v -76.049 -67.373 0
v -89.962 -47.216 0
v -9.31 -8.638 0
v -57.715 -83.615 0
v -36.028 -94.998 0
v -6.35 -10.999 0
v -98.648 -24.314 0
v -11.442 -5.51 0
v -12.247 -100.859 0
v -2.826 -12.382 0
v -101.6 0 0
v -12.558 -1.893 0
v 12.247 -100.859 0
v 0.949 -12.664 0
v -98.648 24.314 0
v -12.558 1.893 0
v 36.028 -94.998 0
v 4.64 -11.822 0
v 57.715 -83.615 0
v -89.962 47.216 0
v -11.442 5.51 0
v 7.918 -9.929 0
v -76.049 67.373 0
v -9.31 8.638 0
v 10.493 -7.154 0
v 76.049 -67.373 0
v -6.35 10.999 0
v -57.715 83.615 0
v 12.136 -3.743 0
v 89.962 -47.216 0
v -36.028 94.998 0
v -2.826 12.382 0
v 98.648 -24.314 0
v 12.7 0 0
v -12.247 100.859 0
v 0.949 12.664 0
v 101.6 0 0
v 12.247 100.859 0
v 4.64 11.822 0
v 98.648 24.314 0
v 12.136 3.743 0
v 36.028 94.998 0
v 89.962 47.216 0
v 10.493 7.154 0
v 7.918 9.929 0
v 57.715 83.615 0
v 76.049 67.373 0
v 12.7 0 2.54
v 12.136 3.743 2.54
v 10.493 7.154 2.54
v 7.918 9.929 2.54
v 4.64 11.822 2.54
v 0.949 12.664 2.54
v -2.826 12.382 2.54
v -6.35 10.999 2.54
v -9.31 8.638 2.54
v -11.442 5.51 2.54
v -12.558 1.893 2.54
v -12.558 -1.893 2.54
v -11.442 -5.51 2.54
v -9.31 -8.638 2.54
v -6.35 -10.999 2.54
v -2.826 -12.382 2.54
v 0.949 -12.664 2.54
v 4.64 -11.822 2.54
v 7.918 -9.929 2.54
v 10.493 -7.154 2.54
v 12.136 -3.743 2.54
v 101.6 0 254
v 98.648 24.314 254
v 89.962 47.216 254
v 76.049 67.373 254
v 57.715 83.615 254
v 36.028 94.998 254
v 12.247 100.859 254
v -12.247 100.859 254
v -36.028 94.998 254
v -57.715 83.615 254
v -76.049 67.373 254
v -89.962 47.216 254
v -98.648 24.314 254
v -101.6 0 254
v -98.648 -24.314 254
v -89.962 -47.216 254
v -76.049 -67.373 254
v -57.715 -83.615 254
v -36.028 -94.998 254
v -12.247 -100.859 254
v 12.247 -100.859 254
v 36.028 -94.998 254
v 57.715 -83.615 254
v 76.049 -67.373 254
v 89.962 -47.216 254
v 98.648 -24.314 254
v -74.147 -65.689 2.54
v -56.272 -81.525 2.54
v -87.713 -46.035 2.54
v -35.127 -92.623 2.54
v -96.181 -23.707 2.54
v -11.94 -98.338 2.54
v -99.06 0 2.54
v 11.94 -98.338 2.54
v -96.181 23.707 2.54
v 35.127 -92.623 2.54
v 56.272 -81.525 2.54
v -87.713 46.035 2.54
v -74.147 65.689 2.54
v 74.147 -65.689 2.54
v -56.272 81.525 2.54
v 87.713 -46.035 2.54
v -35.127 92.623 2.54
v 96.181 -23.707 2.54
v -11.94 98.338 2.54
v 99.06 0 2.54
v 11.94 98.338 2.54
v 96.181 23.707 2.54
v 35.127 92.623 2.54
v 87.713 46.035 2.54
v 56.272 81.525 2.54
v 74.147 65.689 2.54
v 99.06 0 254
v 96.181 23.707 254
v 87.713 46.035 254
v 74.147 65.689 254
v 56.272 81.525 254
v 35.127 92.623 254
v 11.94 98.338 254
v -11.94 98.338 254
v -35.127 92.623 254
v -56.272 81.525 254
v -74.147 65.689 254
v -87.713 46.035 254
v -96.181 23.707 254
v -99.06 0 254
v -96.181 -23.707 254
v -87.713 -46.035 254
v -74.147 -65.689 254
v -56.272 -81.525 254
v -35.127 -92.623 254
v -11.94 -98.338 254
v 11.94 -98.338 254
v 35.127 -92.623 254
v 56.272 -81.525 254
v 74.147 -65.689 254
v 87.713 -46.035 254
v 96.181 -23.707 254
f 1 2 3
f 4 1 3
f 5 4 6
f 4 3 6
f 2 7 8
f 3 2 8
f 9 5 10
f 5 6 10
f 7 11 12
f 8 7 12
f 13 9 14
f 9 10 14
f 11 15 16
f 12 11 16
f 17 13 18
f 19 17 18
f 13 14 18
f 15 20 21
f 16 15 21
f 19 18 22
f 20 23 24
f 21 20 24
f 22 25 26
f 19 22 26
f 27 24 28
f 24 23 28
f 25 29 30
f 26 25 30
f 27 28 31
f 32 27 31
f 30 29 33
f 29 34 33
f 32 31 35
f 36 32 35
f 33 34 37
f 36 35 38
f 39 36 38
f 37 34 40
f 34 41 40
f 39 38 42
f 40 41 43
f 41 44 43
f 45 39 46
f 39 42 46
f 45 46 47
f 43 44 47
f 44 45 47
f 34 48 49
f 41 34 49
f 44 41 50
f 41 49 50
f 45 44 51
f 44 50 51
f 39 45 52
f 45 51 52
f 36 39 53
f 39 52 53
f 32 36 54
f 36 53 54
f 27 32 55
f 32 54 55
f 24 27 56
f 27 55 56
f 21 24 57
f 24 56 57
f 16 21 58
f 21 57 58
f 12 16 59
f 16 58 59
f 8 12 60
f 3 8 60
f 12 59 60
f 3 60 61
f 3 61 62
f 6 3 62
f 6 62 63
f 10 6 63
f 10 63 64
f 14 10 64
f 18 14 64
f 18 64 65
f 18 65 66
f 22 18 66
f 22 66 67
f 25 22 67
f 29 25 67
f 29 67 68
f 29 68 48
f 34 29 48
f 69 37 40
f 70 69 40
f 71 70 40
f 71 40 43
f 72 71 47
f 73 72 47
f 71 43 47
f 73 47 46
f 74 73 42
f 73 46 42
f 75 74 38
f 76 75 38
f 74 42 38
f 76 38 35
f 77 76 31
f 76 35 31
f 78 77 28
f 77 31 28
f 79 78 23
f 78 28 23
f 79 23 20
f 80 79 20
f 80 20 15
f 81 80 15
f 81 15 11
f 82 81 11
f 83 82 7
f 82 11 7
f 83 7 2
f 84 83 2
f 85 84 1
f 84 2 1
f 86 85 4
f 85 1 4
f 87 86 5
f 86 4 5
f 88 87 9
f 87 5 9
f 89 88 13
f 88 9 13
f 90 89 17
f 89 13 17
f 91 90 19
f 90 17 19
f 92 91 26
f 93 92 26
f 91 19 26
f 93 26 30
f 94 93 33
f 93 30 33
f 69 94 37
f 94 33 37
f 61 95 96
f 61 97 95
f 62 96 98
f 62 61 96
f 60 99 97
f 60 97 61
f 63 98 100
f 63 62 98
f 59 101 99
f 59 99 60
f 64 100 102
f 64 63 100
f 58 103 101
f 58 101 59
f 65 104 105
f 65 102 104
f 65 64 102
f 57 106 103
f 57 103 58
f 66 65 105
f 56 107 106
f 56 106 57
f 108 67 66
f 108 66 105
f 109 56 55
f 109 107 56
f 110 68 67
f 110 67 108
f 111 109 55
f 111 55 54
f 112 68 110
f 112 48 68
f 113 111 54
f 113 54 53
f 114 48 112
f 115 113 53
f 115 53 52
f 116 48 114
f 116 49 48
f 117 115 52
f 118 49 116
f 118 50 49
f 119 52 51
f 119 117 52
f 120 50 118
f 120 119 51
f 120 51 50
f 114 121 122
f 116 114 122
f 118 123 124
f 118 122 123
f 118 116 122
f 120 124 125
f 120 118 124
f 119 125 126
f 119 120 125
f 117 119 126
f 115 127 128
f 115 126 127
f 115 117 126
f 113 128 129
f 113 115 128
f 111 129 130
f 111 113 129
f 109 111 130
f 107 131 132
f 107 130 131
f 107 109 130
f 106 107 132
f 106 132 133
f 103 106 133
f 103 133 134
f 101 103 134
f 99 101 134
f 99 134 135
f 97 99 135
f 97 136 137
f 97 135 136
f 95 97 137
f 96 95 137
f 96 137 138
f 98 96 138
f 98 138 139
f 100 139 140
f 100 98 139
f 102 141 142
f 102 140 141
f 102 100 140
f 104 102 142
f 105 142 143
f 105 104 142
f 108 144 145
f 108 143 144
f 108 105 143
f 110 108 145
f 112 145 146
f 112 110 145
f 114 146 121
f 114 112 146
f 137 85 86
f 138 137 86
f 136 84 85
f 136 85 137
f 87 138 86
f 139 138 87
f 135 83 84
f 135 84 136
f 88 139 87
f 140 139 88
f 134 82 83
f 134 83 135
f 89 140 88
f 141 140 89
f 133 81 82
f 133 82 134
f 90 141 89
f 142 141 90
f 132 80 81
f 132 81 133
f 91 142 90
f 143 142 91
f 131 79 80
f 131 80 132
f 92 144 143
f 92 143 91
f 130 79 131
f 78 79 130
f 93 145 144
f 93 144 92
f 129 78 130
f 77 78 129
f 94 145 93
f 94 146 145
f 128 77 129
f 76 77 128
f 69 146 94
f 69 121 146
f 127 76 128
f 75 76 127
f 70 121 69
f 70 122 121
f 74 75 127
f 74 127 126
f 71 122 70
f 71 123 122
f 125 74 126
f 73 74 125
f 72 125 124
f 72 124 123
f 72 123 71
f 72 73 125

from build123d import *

# Parameters (mm, degrees)
SKETCH1_R           = 101.6
BOSS_EXTRUDE1_DEPTH = 254
SHELL1_T            = -2.54
SKETCH2_R           = 12.7
CUT_EXTRUDE1_DEPTH  = 254


with BuildPart() as part:
    # Sketch1 → Boss-Extrude1 (new body)
    with BuildSketch(Plane.XY):
        Circle(SKETCH1_R)
    extrude(amount=BOSS_EXTRUDE1_DEPTH)

    # Shell1
    shell1_openings = [part.faces().sort_by_distance(p)[0] for p in [
        (0, 0, 254),
    ]]
    offset(amount=SHELL1_T, openings=shell1_openings, kind=Kind.INTERSECTION)

    # Sketch2 → Cut-Extrude1 (cut)
    with BuildSketch(Plane.XY.offset(2.54)):
        Circle(SKETCH2_R)
    extrude(amount=-CUT_EXTRUDE1_DEPTH, mode=Mode.SUBTRACT)


solid = part.part
